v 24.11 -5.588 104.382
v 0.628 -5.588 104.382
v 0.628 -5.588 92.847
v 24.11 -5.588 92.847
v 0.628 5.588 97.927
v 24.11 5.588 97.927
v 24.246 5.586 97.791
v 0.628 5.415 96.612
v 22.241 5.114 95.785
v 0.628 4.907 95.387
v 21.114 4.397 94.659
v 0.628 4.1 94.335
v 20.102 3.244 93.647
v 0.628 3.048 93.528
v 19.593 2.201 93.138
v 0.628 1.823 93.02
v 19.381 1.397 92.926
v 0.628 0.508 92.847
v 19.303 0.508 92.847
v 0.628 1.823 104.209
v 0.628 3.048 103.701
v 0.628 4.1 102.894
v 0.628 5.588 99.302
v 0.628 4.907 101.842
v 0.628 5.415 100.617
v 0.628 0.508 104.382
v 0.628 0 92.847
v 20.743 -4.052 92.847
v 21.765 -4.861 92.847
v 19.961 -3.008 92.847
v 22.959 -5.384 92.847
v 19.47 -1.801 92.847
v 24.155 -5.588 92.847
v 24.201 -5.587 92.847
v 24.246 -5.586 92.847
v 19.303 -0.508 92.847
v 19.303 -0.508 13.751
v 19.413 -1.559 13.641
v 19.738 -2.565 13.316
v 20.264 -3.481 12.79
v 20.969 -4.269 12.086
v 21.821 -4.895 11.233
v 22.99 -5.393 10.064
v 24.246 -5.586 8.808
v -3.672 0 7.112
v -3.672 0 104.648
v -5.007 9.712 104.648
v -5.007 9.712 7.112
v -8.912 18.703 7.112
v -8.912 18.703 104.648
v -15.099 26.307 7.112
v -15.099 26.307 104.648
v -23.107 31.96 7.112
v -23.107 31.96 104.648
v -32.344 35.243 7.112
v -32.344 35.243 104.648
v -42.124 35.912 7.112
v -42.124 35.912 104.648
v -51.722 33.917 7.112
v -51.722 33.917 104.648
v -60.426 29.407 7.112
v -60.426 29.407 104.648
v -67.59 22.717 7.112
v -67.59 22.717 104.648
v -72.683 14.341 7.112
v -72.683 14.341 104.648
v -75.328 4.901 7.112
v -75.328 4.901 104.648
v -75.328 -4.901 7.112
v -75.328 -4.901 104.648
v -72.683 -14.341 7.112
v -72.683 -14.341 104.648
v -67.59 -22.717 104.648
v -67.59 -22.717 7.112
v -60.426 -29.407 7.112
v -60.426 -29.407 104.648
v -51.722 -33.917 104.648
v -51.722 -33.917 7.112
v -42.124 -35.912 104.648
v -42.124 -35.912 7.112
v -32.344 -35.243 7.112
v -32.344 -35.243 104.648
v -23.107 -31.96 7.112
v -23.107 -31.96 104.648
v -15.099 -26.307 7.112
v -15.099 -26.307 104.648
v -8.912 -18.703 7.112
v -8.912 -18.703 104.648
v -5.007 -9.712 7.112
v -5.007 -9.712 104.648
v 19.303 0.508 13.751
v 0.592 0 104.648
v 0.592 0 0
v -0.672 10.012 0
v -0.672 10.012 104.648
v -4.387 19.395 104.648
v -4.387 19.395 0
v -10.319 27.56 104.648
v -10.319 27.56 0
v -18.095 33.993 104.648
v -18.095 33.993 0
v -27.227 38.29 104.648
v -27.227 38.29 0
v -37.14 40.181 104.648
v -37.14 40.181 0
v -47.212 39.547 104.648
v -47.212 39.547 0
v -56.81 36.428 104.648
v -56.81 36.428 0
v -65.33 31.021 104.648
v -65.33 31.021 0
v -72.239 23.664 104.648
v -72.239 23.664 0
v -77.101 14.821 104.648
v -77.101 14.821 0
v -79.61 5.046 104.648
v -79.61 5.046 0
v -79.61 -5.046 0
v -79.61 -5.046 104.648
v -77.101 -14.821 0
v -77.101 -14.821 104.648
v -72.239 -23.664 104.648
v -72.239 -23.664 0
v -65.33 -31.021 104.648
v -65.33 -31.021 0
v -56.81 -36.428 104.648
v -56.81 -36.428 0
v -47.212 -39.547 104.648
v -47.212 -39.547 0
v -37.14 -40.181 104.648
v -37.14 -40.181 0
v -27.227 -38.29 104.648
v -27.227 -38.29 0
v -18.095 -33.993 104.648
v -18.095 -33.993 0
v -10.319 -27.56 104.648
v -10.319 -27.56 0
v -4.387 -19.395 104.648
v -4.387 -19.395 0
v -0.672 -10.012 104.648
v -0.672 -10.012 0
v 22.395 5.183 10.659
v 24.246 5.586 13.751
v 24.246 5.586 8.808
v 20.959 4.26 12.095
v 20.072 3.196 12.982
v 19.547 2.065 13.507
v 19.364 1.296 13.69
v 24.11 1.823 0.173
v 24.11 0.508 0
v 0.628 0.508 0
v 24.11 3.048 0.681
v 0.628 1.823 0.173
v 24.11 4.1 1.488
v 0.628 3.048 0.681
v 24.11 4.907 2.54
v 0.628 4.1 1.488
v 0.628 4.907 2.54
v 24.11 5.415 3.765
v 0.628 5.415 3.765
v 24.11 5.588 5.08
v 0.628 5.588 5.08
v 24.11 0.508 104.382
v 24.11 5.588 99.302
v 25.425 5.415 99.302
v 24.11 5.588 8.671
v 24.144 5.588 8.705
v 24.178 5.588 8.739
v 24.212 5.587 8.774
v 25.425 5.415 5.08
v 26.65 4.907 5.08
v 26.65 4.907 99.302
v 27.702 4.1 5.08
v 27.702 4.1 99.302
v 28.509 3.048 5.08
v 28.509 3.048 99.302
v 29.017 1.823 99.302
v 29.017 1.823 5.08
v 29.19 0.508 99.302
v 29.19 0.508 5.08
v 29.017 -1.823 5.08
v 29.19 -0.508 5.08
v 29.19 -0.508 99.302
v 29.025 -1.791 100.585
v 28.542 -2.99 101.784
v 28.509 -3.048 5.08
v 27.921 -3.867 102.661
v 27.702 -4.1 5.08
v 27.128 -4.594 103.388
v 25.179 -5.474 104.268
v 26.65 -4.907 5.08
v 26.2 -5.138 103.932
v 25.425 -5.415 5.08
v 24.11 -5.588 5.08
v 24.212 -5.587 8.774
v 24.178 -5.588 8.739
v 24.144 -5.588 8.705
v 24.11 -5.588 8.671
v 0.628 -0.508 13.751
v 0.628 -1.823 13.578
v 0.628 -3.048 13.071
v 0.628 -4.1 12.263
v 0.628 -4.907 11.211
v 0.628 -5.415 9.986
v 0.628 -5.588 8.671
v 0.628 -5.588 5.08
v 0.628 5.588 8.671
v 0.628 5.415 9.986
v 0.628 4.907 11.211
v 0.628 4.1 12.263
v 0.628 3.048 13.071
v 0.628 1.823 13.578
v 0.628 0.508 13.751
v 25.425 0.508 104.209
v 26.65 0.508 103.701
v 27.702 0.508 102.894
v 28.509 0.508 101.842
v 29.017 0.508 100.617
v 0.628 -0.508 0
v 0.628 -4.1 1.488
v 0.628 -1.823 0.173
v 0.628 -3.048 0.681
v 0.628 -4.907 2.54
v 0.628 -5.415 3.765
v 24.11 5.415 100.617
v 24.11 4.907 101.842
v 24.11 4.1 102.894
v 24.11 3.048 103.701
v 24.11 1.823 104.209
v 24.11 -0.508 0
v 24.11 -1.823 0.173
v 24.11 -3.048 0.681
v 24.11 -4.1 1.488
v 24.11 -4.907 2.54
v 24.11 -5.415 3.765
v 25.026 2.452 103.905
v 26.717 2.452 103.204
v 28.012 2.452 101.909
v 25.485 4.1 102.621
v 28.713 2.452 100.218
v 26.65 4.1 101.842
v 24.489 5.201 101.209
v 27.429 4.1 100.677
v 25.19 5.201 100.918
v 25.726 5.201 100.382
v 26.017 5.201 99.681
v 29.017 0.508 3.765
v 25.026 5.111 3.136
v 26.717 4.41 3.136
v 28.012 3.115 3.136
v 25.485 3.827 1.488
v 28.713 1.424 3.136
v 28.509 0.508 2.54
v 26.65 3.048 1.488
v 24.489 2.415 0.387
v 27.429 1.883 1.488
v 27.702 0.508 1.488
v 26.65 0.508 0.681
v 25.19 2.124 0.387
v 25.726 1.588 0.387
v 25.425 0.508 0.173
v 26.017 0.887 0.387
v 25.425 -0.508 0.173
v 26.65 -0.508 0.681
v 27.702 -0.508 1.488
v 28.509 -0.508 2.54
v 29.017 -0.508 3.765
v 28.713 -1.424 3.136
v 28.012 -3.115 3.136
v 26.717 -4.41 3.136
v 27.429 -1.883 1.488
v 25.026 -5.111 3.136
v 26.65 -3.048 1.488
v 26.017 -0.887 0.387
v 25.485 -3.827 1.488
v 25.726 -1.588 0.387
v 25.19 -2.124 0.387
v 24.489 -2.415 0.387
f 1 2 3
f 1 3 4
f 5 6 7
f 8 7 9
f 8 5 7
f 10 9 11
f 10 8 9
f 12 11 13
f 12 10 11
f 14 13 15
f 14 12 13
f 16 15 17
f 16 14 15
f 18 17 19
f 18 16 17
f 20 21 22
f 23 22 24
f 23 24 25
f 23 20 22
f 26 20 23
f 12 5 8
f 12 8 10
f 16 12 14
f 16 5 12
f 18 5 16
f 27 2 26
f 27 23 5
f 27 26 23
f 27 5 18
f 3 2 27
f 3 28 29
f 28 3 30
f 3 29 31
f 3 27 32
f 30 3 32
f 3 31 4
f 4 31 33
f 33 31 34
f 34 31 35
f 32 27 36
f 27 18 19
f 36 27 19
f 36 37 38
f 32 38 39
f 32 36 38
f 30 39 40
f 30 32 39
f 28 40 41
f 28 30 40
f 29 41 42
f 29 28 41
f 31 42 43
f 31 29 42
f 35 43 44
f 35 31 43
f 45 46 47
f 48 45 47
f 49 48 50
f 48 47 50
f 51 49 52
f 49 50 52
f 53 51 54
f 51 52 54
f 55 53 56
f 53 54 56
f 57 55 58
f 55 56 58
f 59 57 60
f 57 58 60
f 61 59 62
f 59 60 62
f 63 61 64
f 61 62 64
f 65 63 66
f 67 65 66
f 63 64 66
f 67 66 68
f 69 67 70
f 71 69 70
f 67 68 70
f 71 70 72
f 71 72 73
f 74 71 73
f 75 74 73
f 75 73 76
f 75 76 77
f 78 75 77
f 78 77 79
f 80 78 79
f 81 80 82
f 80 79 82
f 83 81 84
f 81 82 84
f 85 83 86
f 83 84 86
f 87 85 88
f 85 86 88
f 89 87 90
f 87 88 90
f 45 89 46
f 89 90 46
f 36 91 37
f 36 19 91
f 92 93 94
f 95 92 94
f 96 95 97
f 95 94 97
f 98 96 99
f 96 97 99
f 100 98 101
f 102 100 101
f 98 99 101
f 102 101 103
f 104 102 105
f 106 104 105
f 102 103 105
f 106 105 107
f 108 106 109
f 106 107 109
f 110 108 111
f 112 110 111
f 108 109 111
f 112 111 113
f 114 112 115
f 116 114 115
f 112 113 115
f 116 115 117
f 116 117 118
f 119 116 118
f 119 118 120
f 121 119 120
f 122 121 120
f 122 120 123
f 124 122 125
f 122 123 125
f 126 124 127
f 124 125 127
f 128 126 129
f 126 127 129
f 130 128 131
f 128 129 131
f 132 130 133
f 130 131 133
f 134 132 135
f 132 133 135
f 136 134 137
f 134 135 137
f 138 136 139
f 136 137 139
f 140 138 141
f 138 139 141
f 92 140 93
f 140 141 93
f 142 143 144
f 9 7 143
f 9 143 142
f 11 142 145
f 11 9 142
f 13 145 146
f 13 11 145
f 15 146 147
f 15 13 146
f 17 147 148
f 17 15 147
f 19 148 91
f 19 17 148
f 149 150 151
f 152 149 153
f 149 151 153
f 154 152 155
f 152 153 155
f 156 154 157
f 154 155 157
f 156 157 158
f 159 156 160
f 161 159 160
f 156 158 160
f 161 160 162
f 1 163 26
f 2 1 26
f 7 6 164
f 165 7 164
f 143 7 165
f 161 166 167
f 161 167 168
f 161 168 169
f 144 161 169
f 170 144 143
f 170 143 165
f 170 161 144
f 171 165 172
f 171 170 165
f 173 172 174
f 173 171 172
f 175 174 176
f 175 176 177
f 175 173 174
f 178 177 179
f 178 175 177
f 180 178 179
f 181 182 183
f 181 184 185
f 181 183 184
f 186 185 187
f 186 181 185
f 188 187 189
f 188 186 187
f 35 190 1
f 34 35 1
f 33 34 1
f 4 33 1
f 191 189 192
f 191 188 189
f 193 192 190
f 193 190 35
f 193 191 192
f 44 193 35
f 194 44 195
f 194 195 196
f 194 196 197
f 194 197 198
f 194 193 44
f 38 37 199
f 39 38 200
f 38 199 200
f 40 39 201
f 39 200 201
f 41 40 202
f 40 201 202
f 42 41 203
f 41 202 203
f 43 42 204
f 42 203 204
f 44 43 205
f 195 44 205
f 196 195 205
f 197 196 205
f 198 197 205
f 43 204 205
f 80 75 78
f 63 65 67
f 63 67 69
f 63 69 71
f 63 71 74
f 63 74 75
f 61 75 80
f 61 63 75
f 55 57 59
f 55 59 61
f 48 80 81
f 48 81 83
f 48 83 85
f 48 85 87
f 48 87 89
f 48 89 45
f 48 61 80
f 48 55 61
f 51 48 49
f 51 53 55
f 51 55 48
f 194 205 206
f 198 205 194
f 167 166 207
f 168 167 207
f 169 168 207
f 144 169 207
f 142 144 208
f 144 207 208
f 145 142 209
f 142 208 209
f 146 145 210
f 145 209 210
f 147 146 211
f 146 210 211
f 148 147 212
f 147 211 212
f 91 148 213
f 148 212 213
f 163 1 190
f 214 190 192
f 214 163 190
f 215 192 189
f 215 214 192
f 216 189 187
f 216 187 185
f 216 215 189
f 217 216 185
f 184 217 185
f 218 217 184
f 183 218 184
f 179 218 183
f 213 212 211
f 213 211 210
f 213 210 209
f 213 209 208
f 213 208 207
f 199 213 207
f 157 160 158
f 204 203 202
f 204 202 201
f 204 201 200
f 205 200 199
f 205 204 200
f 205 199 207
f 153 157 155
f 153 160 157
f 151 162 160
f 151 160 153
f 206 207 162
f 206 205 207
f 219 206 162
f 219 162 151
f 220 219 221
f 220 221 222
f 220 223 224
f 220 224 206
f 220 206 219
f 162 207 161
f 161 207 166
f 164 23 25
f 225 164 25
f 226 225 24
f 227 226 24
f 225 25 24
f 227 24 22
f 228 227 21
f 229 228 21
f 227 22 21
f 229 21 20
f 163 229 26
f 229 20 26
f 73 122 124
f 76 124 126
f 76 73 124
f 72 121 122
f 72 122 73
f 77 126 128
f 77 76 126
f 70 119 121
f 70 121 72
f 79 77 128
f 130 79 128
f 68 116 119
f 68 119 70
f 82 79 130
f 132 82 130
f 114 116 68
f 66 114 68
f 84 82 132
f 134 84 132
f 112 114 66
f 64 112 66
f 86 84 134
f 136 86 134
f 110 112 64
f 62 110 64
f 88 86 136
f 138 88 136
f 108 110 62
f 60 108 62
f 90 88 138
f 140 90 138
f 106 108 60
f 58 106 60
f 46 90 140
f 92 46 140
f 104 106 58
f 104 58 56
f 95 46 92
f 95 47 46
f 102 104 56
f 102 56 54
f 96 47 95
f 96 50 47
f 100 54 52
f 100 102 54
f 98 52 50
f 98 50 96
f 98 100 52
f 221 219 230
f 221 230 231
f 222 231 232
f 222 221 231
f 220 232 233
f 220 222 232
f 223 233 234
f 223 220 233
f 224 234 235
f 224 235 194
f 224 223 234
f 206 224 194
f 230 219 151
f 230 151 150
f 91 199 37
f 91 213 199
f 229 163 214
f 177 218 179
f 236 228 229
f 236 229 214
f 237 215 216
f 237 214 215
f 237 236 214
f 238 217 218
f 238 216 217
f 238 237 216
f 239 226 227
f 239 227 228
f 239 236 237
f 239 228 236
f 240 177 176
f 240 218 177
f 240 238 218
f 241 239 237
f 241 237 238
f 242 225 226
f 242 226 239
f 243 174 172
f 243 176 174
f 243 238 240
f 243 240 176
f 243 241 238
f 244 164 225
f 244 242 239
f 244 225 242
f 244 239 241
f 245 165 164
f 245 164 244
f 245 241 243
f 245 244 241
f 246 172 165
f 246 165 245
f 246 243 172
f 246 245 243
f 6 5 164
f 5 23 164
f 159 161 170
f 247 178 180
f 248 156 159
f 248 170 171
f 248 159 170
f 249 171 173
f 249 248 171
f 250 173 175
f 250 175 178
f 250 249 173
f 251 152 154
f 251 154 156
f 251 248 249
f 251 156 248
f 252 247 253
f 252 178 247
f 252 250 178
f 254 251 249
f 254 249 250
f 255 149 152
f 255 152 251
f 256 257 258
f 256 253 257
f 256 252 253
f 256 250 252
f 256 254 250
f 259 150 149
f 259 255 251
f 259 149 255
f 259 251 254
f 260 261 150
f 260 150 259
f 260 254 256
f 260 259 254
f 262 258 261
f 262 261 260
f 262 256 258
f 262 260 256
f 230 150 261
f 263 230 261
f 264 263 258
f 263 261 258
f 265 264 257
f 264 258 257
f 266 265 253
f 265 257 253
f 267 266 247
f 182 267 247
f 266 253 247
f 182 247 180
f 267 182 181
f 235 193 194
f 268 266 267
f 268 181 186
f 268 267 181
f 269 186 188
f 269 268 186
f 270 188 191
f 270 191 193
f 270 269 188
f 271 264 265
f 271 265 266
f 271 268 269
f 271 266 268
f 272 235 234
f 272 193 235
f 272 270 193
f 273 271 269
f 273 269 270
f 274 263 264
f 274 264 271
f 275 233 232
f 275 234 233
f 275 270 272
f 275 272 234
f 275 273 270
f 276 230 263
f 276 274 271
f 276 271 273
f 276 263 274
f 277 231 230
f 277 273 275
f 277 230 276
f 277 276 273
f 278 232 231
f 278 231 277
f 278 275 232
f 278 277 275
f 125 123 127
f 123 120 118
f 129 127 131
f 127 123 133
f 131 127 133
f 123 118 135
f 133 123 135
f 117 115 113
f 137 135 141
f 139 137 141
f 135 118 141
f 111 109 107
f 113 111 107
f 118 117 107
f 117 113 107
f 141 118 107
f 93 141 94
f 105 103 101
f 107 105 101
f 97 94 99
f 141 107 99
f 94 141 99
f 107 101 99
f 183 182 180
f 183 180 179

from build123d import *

# Parameters (mm, degrees)
F0_R         = 40.2600949405
F1_DEPTH     = 104.648
F2_R         = 35.9958099421
F3_DEPTH     = 97.536
F4_W         = 18.675433821
F4_H         = 79.0959624574
F5_DEPTH     = 5.588
F6_DEPTH     = 5.588
F7_DEPTH     = 72.39
F8_T1_DEPTH  = 18.796
F8_T3_DEPTH  = 1.016
F8_T5_DEPTH  = 31.375433821
F8_T7_DEPTH  = 79.0959624574
F8_T9_DEPTH  = 112.001993413
F8_T11_DEPTH = 94.221993413
F8_T13_DEPTH = 36.1824306416
F8_S17_W     = 5.08
F8_S17_H     = 5.08
F8_T18_DEPTH = 5.08
F8_S23_W     = 5.08
F8_S23_H     = 5.08
F8_T24_DEPTH = 5.08
F8_S29_W     = 5.08
F8_S29_H     = 5.08
F8_T30_DEPTH = 5.08
F8_T37_DEPTH = 44.075433821
F8_T41_DEPTH = 91.7959624574
F8_T48_DEPTH = 44.075433821
F8_T52_DEPTH = 91.7959624574
F8_T59_DEPTH = 91.7959624574
F8_T63_DEPTH = 44.075433821


# Not quite as in the source:
# - a fillet or chamfer that OpenCascade refuses, or shapes differently, is made with other operations: its cross-section is extruded or revolved along the edge and cut away or added


with BuildPart() as f1:
    # F0 (on Top) → F1 (new body)
    with BuildSketch(Plane.XY):
        with Locations((-39.6676883101, 0)):
            Circle(F0_R)
    extrude(amount=F1_DEPTH)

    # F2 (on face) → F3 (cut)
    with BuildSketch(Plane.XY.offset(104.648)):
        with Locations((-39.6676883101, 0)):
            Circle(F2_R)
    extrude(amount=-F3_DEPTH, mode=Mode.SUBTRACT)


with BuildPart() as f5:
    # F4 (on Front) → F5 (new body)
    with BuildSketch(Plane.XZ):
        Polygon((0.6275248015, 13.7512059882), (0.6275248015, 0), (29.1899554431, 0), (29.1899554431, 104.381993413), (0.6275248015, 104.381993413), (0.6275248015, 92.8471684456), (19.3029586226, 92.8471684456), (19.3029586226, 13.7512059882), align=None)
        with Locations((9.9652417121, 53.2991872169)):
            Rectangle(F4_W, F4_H)
    extrude(amount=F5_DEPTH)

    # F4 (on Front) → F6 (join)
    with BuildSketch(Plane.XZ):
        Polygon((0.6275248015, 13.7512059882), (0.6275248015, 0), (29.1899554431, 0), (29.1899554431, 104.381993413), (0.6275248015, 104.381993413), (0.6275248015, 92.8471684456), (19.3029586226, 92.8471684456), (19.3029586226, 13.7512059882), align=None)
    extrude(amount=-F6_DEPTH)

    # F4 (on Front) → F7 (cut)
    with BuildSketch(Plane.XZ):
        with Locations((9.9652417121, 53.2991872169)):
            Rectangle(F4_W, F4_H)
    extrude(amount=F7_DEPTH, mode=Mode.SUBTRACT)

    # F8: fillet of radius 5.08 on 12 edges, made by hand

    # F8_s2 → F8_t1 (cut)
    with BuildSketch(Plane.XZ.offset(-0.508)):
        with BuildLine():
            ThreePointArc((24.1099554431, 104.381993413), (27.7020578916, 102.8940958614), (29.1899554431, 99.301993413))
            Line((29.1899554431, 99.301993413), (29.1899554431, 104.381993413))
            Line((29.1899554431, 104.381993413), (24.1099554431, 104.381993413))
        make_face()
    extrude(amount=F8_T1_DEPTH, mode=Mode.SUBTRACT)

    # F8_s4 → F8_t3 (cut)
    with BuildSketch(Plane.XZ.offset(-0.508)):
        with BuildLine():
            ThreePointArc((24.1099554431, 0), (27.7020578916, 1.4878975516), (29.1899554431, 5.08))
            Line((29.1899554431, 5.08), (29.1899554431, 0))
            Line((29.1899554431, 0), (24.1099554431, 0))
        make_face()
    extrude(amount=F8_T3_DEPTH, mode=Mode.SUBTRACT)

    # F8_s6 → F8_t5 (cut)
    with BuildSketch(Plane.YZ.offset(-12.0724751985)):
        with BuildLine():
            ThreePointArc((-0.508, 13.7512059882), (-4.1001024484, 12.2633084367), (-5.588, 8.6712059882))
            Line((-5.588, 8.6712059882), (-5.588, 13.7512059882))
            Line((-5.588, 13.7512059882), (-0.508, 13.7512059882))
        make_face()
        with BuildLine():
            ThreePointArc((5.588, 97.9271684456), (4.1001024484, 94.3350659972), (0.508, 92.8471684456))
            Line((0.508, 92.8471684456), (5.588, 92.8471684456))
            Line((5.588, 92.8471684456), (5.588, 97.9271684456))
        make_face()
        with BuildLine():
            ThreePointArc((5.588, 8.6712059882), (4.1001024484, 12.2633084367), (0.508, 13.7512059882))
            Line((0.508, 13.7512059882), (5.588, 13.7512059882))
            Line((5.588, 13.7512059882), (5.588, 8.6712059882))
        make_face()
    extrude(amount=F8_T5_DEPTH, mode=Mode.SUBTRACT)

    # F8_s8 → F8_t7 (cut)
    with BuildSketch(Plane.XY.offset(13.7512059882)):
        with BuildLine():
            ThreePointArc((19.3029586226, -0.508), (20.7908561741, -4.1001024484), (24.3829586226, -5.588))
            Line((24.3829586226, -5.588), (19.3029586226, -5.588))
            Line((19.3029586226, -5.588), (19.3029586226, -0.508))
        make_face()
        with BuildLine():
            ThreePointArc((24.3829586226, 5.588), (20.7908561741, 4.1001024484), (19.3029586226, 0.508))
            Line((19.3029586226, 0.508), (19.3029586226, 5.588))
            Line((19.3029586226, 5.588), (24.3829586226, 5.588))
        make_face()
    extrude(amount=F8_T7_DEPTH, mode=Mode.SUBTRACT)

    # F8_s10 → F8_t9 (cut)
    with BuildSketch(Plane.XY.offset(5.08)):
        with BuildLine():
            ThreePointArc((29.1899554431, -0.508), (27.7020578916, -4.1001024484), (24.1099554431, -5.588))
            Line((24.1099554431, -5.588), (29.1899554431, -5.588))
            Line((29.1899554431, -5.588), (29.1899554431, -0.508))
        make_face()
    extrude(amount=F8_T9_DEPTH, mode=Mode.SUBTRACT)

    # F8_s12 → F8_t11 (cut)
    with BuildSketch(Plane.XY.offset(5.08)):
        with BuildLine():
            ThreePointArc((24.1099554431, 5.588), (27.7020578916, 4.1001024484), (29.1899554431, 0.508))
            Line((29.1899554431, 0.508), (29.1899554431, 5.588))
            Line((29.1899554431, 5.588), (24.1099554431, 5.588))
        make_face()
    extrude(amount=F8_T11_DEPTH, mode=Mode.SUBTRACT)

    # F8_s14 → F8_t13 (cut)
    with BuildSketch(Plane.YZ.offset(-12.0724751985)):
        with BuildLine():
            ThreePointArc((5.588, 99.301993413), (4.1001024484, 102.8940958614), (0.508, 104.381993413))
            Line((0.508, 104.381993413), (5.588, 104.381993413))
            Line((5.588, 104.381993413), (5.588, 99.301993413))
        make_face()
        with BuildLine():
            ThreePointArc((0.508, 0), (4.1001024484, 1.4878975516), (5.588, 5.08))
            Line((5.588, 5.08), (5.588, 0))
            Line((5.588, 0), (0.508, 0))
        make_face()
        with BuildLine():
            ThreePointArc((-0.508, 0), (-4.1001024484, 1.4878975516), (-5.588, 5.08))
            Line((-5.588, 5.08), (-5.588, 0))
            Line((-5.588, 0), (-0.508, 0))
        make_face()
    extrude(amount=F8_T13_DEPTH, mode=Mode.SUBTRACT)


with BuildPart() as f8_tool16:
    # F8_s17 → F8_t18 (new body)
    with BuildSketch(Plane.XZ.offset(-0.508)):
        with Locations((26.6499554431, 101.841993413)):
            Rectangle(F8_S17_W, F8_S17_H)
    extrude(amount=-F8_T18_DEPTH)

    # F8_s19 → F8_t20 (revolve, cut)
    with BuildSketch(Plane(origin=(24.1099554431, 0.508, 99.301993413), x_dir=(-0.7071067812, 0, -0.7071067812), z_dir=(0.7071067812, 0, -0.7071067812))):
        with BuildLine():
            ThreePointArc((0, -5.08), (5.08, 0), (0, 5.08))
            Line((0, 5.08), (0, -5.08))
        make_face()
    revolve(axis=Axis((24.1099554431, 0.508, 99.301993413), (0, 1, 0)), mode=Mode.SUBTRACT)


with BuildPart() as f5_1:
    add(f5.part)

    # F8_t15: cut F8_tool16
    add(f8_tool16.part, mode=Mode.SUBTRACT)


with BuildPart() as f8_tool22:
    # F8_s23 → F8_t24 (new body)
    with BuildSketch(Plane.XY.offset(5.08)):
        with Locations((26.6499554431, 3.048)):
            Rectangle(F8_S23_W, F8_S23_H)
    extrude(amount=-F8_T24_DEPTH)

    # F8_s25 → F8_t26 (revolve, cut)
    with BuildSketch(Plane(origin=(24.1099554431, 0.508, 5.08), x_dir=(-0.7071067812, -0.7071067812, 0), z_dir=(0.7071067812, -0.7071067812, 0))):
        with BuildLine():
            ThreePointArc((0, -5.08), (5.08, 0), (0, 5.08))
            Line((0, 5.08), (0, -5.08))
        make_face()
    revolve(axis=Axis((24.1099554431, 0.508, 5.08), (0, 0, -1)), mode=Mode.SUBTRACT)


with BuildPart() as f5_2:
    add(f5_1.part)

    # F8_t21: cut F8_tool22
    add(f8_tool22.part, mode=Mode.SUBTRACT)


with BuildPart() as f8_tool28:
    # F8_s29 → F8_t30 (new body)
    with BuildSketch(Plane.XY.offset(5.08)):
        with Locations((26.6499554431, -3.048)):
            Rectangle(F8_S29_W, F8_S29_H)
    extrude(amount=-F8_T30_DEPTH)

    # F8_s31 → F8_t32 (revolve, cut)
    with BuildSketch(Plane(origin=(24.1099554431, -0.508, 5.08), x_dir=(-0.7071067812, 0.7071067812, 0), z_dir=(-0.7071067812, -0.7071067812, 0))):
        with BuildLine():
            ThreePointArc((0, -5.08), (5.08, 0), (0, 5.08))
            Line((0, 5.08), (0, -5.08))
        make_face()
    revolve(axis=Axis((24.1099554431, -0.508, 5.08), (0, 0, -1)), mode=Mode.SUBTRACT)


with BuildPart() as f5_3:
    add(f5_2.part)

    # F8_t27: cut F8_tool28
    add(f8_tool28.part, mode=Mode.SUBTRACT)


with BuildPart() as f8_tool35:
    # F8_s36 → F8_t37 (new body)
    with BuildSketch(Plane.YZ.offset(32.0029586226)):
        with BuildLine():
            ThreePointArc((-0.508, 13.7512059882), (-4.1001024484, 12.2633084367), (-5.588, 8.6712059882))
            Line((-5.588, 8.6712059882), (-5.588, 13.7512059882))
            Line((-5.588, 13.7512059882), (-0.508, 13.7512059882))
        make_face()
    extrude(amount=-F8_T37_DEPTH)

    split(bisect_by=Plane.YZ.offset(19.3029586226), keep=Keep.TOP)


with BuildPart() as f8_tool39:
    # F8_s40 → F8_t41 (new body)
    with BuildSketch(Plane.XY.offset(92.8471684456)):
        with BuildLine():
            ThreePointArc((19.3029586226, -0.508), (20.7908561741, -4.1001024484), (24.3829586226, -5.588))
            Line((24.3829586226, -5.588), (19.3029586226, -5.588))
            Line((19.3029586226, -5.588), (19.3029586226, -0.508))
        make_face()
    extrude(amount=-F8_T41_DEPTH)

    split(bisect_by=Plane.XY.offset(13.7512059882), keep=Keep.BOTTOM)


with BuildPart() as f8_tool35_1:
    add(f8_tool35.part)

    # F8_t43: intersect F8_tool39
    add(f8_tool39.part, mode=Mode.INTERSECT)


with BuildPart() as f5_4:
    add(f5_3.part)

    # F8_t33: cut F8_tool35
    add(f8_tool35_1.part, mode=Mode.SUBTRACT)


with BuildPart() as f8_tool46:
    # F8_s47 → F8_t48 (new body)
    with BuildSketch(Plane.YZ.offset(-12.0724751985)):
        with BuildLine():
            ThreePointArc((5.588, 97.9271684456), (4.1001024484, 94.3350659972), (0.508, 92.8471684456))
            Line((0.508, 92.8471684456), (5.588, 92.8471684456))
            Line((5.588, 92.8471684456), (5.588, 97.9271684456))
        make_face()
    extrude(amount=F8_T48_DEPTH)

    split(bisect_by=Plane.YZ.offset(19.3029586226), keep=Keep.TOP)


with BuildPart() as f8_tool50:
    # F8_s51 → F8_t52 (new body)
    with BuildSketch(Plane.XY.offset(105.5471684456)):
        with BuildLine():
            ThreePointArc((24.3829586226, 5.588), (20.7908561741, 4.1001024484), (19.3029586226, 0.508))
            Line((19.3029586226, 0.508), (19.3029586226, 5.588))
            Line((19.3029586226, 5.588), (24.3829586226, 5.588))
        make_face()
    extrude(amount=-F8_T52_DEPTH)

    split(bisect_by=Plane.XY.offset(92.8471684456), keep=Keep.TOP)


with BuildPart() as f8_tool46_1:
    add(f8_tool46.part)

    # F8_t54: intersect F8_tool50
    add(f8_tool50.part, mode=Mode.INTERSECT)


with BuildPart() as f5_5:
    add(f5_4.part)

    # F8_t44: cut F8_tool46
    add(f8_tool46_1.part, mode=Mode.SUBTRACT)


with BuildPart() as f8_tool57:
    # F8_s58 → F8_t59 (new body)
    with BuildSketch(Plane.XY.offset(92.8471684456)):
        with BuildLine():
            ThreePointArc((24.3829586226, 5.588), (20.7908561741, 4.1001024484), (19.3029586226, 0.508))
            Line((19.3029586226, 0.508), (19.3029586226, 5.588))
            Line((19.3029586226, 5.588), (24.3829586226, 5.588))
        make_face()
    extrude(amount=-F8_T59_DEPTH)

    split(bisect_by=Plane.XY.offset(13.7512059882), keep=Keep.BOTTOM)


with BuildPart() as f8_tool61:
    # F8_s62 → F8_t63 (new body)
    with BuildSketch(Plane.YZ.offset(32.0029586226)):
        with BuildLine():
            ThreePointArc((5.588, 8.6712059882), (4.1001024484, 12.2633084367), (0.508, 13.7512059882))
            Line((0.508, 13.7512059882), (5.588, 13.7512059882))
            Line((5.588, 13.7512059882), (5.588, 8.6712059882))
        make_face()
    extrude(amount=-F8_T63_DEPTH)

    split(bisect_by=Plane.YZ.offset(19.3029586226), keep=Keep.TOP)


with BuildPart() as f8_tool57_1:
    add(f8_tool57.part)

    # F8_t65: intersect F8_tool61
    add(f8_tool61.part, mode=Mode.INTERSECT)


with BuildPart() as f5_6:
    add(f5_5.part)

    # F8_t55: cut F8_tool57
    add(f8_tool57_1.part, mode=Mode.SUBTRACT)


solid = Compound([f1.part, f5_6.part])
